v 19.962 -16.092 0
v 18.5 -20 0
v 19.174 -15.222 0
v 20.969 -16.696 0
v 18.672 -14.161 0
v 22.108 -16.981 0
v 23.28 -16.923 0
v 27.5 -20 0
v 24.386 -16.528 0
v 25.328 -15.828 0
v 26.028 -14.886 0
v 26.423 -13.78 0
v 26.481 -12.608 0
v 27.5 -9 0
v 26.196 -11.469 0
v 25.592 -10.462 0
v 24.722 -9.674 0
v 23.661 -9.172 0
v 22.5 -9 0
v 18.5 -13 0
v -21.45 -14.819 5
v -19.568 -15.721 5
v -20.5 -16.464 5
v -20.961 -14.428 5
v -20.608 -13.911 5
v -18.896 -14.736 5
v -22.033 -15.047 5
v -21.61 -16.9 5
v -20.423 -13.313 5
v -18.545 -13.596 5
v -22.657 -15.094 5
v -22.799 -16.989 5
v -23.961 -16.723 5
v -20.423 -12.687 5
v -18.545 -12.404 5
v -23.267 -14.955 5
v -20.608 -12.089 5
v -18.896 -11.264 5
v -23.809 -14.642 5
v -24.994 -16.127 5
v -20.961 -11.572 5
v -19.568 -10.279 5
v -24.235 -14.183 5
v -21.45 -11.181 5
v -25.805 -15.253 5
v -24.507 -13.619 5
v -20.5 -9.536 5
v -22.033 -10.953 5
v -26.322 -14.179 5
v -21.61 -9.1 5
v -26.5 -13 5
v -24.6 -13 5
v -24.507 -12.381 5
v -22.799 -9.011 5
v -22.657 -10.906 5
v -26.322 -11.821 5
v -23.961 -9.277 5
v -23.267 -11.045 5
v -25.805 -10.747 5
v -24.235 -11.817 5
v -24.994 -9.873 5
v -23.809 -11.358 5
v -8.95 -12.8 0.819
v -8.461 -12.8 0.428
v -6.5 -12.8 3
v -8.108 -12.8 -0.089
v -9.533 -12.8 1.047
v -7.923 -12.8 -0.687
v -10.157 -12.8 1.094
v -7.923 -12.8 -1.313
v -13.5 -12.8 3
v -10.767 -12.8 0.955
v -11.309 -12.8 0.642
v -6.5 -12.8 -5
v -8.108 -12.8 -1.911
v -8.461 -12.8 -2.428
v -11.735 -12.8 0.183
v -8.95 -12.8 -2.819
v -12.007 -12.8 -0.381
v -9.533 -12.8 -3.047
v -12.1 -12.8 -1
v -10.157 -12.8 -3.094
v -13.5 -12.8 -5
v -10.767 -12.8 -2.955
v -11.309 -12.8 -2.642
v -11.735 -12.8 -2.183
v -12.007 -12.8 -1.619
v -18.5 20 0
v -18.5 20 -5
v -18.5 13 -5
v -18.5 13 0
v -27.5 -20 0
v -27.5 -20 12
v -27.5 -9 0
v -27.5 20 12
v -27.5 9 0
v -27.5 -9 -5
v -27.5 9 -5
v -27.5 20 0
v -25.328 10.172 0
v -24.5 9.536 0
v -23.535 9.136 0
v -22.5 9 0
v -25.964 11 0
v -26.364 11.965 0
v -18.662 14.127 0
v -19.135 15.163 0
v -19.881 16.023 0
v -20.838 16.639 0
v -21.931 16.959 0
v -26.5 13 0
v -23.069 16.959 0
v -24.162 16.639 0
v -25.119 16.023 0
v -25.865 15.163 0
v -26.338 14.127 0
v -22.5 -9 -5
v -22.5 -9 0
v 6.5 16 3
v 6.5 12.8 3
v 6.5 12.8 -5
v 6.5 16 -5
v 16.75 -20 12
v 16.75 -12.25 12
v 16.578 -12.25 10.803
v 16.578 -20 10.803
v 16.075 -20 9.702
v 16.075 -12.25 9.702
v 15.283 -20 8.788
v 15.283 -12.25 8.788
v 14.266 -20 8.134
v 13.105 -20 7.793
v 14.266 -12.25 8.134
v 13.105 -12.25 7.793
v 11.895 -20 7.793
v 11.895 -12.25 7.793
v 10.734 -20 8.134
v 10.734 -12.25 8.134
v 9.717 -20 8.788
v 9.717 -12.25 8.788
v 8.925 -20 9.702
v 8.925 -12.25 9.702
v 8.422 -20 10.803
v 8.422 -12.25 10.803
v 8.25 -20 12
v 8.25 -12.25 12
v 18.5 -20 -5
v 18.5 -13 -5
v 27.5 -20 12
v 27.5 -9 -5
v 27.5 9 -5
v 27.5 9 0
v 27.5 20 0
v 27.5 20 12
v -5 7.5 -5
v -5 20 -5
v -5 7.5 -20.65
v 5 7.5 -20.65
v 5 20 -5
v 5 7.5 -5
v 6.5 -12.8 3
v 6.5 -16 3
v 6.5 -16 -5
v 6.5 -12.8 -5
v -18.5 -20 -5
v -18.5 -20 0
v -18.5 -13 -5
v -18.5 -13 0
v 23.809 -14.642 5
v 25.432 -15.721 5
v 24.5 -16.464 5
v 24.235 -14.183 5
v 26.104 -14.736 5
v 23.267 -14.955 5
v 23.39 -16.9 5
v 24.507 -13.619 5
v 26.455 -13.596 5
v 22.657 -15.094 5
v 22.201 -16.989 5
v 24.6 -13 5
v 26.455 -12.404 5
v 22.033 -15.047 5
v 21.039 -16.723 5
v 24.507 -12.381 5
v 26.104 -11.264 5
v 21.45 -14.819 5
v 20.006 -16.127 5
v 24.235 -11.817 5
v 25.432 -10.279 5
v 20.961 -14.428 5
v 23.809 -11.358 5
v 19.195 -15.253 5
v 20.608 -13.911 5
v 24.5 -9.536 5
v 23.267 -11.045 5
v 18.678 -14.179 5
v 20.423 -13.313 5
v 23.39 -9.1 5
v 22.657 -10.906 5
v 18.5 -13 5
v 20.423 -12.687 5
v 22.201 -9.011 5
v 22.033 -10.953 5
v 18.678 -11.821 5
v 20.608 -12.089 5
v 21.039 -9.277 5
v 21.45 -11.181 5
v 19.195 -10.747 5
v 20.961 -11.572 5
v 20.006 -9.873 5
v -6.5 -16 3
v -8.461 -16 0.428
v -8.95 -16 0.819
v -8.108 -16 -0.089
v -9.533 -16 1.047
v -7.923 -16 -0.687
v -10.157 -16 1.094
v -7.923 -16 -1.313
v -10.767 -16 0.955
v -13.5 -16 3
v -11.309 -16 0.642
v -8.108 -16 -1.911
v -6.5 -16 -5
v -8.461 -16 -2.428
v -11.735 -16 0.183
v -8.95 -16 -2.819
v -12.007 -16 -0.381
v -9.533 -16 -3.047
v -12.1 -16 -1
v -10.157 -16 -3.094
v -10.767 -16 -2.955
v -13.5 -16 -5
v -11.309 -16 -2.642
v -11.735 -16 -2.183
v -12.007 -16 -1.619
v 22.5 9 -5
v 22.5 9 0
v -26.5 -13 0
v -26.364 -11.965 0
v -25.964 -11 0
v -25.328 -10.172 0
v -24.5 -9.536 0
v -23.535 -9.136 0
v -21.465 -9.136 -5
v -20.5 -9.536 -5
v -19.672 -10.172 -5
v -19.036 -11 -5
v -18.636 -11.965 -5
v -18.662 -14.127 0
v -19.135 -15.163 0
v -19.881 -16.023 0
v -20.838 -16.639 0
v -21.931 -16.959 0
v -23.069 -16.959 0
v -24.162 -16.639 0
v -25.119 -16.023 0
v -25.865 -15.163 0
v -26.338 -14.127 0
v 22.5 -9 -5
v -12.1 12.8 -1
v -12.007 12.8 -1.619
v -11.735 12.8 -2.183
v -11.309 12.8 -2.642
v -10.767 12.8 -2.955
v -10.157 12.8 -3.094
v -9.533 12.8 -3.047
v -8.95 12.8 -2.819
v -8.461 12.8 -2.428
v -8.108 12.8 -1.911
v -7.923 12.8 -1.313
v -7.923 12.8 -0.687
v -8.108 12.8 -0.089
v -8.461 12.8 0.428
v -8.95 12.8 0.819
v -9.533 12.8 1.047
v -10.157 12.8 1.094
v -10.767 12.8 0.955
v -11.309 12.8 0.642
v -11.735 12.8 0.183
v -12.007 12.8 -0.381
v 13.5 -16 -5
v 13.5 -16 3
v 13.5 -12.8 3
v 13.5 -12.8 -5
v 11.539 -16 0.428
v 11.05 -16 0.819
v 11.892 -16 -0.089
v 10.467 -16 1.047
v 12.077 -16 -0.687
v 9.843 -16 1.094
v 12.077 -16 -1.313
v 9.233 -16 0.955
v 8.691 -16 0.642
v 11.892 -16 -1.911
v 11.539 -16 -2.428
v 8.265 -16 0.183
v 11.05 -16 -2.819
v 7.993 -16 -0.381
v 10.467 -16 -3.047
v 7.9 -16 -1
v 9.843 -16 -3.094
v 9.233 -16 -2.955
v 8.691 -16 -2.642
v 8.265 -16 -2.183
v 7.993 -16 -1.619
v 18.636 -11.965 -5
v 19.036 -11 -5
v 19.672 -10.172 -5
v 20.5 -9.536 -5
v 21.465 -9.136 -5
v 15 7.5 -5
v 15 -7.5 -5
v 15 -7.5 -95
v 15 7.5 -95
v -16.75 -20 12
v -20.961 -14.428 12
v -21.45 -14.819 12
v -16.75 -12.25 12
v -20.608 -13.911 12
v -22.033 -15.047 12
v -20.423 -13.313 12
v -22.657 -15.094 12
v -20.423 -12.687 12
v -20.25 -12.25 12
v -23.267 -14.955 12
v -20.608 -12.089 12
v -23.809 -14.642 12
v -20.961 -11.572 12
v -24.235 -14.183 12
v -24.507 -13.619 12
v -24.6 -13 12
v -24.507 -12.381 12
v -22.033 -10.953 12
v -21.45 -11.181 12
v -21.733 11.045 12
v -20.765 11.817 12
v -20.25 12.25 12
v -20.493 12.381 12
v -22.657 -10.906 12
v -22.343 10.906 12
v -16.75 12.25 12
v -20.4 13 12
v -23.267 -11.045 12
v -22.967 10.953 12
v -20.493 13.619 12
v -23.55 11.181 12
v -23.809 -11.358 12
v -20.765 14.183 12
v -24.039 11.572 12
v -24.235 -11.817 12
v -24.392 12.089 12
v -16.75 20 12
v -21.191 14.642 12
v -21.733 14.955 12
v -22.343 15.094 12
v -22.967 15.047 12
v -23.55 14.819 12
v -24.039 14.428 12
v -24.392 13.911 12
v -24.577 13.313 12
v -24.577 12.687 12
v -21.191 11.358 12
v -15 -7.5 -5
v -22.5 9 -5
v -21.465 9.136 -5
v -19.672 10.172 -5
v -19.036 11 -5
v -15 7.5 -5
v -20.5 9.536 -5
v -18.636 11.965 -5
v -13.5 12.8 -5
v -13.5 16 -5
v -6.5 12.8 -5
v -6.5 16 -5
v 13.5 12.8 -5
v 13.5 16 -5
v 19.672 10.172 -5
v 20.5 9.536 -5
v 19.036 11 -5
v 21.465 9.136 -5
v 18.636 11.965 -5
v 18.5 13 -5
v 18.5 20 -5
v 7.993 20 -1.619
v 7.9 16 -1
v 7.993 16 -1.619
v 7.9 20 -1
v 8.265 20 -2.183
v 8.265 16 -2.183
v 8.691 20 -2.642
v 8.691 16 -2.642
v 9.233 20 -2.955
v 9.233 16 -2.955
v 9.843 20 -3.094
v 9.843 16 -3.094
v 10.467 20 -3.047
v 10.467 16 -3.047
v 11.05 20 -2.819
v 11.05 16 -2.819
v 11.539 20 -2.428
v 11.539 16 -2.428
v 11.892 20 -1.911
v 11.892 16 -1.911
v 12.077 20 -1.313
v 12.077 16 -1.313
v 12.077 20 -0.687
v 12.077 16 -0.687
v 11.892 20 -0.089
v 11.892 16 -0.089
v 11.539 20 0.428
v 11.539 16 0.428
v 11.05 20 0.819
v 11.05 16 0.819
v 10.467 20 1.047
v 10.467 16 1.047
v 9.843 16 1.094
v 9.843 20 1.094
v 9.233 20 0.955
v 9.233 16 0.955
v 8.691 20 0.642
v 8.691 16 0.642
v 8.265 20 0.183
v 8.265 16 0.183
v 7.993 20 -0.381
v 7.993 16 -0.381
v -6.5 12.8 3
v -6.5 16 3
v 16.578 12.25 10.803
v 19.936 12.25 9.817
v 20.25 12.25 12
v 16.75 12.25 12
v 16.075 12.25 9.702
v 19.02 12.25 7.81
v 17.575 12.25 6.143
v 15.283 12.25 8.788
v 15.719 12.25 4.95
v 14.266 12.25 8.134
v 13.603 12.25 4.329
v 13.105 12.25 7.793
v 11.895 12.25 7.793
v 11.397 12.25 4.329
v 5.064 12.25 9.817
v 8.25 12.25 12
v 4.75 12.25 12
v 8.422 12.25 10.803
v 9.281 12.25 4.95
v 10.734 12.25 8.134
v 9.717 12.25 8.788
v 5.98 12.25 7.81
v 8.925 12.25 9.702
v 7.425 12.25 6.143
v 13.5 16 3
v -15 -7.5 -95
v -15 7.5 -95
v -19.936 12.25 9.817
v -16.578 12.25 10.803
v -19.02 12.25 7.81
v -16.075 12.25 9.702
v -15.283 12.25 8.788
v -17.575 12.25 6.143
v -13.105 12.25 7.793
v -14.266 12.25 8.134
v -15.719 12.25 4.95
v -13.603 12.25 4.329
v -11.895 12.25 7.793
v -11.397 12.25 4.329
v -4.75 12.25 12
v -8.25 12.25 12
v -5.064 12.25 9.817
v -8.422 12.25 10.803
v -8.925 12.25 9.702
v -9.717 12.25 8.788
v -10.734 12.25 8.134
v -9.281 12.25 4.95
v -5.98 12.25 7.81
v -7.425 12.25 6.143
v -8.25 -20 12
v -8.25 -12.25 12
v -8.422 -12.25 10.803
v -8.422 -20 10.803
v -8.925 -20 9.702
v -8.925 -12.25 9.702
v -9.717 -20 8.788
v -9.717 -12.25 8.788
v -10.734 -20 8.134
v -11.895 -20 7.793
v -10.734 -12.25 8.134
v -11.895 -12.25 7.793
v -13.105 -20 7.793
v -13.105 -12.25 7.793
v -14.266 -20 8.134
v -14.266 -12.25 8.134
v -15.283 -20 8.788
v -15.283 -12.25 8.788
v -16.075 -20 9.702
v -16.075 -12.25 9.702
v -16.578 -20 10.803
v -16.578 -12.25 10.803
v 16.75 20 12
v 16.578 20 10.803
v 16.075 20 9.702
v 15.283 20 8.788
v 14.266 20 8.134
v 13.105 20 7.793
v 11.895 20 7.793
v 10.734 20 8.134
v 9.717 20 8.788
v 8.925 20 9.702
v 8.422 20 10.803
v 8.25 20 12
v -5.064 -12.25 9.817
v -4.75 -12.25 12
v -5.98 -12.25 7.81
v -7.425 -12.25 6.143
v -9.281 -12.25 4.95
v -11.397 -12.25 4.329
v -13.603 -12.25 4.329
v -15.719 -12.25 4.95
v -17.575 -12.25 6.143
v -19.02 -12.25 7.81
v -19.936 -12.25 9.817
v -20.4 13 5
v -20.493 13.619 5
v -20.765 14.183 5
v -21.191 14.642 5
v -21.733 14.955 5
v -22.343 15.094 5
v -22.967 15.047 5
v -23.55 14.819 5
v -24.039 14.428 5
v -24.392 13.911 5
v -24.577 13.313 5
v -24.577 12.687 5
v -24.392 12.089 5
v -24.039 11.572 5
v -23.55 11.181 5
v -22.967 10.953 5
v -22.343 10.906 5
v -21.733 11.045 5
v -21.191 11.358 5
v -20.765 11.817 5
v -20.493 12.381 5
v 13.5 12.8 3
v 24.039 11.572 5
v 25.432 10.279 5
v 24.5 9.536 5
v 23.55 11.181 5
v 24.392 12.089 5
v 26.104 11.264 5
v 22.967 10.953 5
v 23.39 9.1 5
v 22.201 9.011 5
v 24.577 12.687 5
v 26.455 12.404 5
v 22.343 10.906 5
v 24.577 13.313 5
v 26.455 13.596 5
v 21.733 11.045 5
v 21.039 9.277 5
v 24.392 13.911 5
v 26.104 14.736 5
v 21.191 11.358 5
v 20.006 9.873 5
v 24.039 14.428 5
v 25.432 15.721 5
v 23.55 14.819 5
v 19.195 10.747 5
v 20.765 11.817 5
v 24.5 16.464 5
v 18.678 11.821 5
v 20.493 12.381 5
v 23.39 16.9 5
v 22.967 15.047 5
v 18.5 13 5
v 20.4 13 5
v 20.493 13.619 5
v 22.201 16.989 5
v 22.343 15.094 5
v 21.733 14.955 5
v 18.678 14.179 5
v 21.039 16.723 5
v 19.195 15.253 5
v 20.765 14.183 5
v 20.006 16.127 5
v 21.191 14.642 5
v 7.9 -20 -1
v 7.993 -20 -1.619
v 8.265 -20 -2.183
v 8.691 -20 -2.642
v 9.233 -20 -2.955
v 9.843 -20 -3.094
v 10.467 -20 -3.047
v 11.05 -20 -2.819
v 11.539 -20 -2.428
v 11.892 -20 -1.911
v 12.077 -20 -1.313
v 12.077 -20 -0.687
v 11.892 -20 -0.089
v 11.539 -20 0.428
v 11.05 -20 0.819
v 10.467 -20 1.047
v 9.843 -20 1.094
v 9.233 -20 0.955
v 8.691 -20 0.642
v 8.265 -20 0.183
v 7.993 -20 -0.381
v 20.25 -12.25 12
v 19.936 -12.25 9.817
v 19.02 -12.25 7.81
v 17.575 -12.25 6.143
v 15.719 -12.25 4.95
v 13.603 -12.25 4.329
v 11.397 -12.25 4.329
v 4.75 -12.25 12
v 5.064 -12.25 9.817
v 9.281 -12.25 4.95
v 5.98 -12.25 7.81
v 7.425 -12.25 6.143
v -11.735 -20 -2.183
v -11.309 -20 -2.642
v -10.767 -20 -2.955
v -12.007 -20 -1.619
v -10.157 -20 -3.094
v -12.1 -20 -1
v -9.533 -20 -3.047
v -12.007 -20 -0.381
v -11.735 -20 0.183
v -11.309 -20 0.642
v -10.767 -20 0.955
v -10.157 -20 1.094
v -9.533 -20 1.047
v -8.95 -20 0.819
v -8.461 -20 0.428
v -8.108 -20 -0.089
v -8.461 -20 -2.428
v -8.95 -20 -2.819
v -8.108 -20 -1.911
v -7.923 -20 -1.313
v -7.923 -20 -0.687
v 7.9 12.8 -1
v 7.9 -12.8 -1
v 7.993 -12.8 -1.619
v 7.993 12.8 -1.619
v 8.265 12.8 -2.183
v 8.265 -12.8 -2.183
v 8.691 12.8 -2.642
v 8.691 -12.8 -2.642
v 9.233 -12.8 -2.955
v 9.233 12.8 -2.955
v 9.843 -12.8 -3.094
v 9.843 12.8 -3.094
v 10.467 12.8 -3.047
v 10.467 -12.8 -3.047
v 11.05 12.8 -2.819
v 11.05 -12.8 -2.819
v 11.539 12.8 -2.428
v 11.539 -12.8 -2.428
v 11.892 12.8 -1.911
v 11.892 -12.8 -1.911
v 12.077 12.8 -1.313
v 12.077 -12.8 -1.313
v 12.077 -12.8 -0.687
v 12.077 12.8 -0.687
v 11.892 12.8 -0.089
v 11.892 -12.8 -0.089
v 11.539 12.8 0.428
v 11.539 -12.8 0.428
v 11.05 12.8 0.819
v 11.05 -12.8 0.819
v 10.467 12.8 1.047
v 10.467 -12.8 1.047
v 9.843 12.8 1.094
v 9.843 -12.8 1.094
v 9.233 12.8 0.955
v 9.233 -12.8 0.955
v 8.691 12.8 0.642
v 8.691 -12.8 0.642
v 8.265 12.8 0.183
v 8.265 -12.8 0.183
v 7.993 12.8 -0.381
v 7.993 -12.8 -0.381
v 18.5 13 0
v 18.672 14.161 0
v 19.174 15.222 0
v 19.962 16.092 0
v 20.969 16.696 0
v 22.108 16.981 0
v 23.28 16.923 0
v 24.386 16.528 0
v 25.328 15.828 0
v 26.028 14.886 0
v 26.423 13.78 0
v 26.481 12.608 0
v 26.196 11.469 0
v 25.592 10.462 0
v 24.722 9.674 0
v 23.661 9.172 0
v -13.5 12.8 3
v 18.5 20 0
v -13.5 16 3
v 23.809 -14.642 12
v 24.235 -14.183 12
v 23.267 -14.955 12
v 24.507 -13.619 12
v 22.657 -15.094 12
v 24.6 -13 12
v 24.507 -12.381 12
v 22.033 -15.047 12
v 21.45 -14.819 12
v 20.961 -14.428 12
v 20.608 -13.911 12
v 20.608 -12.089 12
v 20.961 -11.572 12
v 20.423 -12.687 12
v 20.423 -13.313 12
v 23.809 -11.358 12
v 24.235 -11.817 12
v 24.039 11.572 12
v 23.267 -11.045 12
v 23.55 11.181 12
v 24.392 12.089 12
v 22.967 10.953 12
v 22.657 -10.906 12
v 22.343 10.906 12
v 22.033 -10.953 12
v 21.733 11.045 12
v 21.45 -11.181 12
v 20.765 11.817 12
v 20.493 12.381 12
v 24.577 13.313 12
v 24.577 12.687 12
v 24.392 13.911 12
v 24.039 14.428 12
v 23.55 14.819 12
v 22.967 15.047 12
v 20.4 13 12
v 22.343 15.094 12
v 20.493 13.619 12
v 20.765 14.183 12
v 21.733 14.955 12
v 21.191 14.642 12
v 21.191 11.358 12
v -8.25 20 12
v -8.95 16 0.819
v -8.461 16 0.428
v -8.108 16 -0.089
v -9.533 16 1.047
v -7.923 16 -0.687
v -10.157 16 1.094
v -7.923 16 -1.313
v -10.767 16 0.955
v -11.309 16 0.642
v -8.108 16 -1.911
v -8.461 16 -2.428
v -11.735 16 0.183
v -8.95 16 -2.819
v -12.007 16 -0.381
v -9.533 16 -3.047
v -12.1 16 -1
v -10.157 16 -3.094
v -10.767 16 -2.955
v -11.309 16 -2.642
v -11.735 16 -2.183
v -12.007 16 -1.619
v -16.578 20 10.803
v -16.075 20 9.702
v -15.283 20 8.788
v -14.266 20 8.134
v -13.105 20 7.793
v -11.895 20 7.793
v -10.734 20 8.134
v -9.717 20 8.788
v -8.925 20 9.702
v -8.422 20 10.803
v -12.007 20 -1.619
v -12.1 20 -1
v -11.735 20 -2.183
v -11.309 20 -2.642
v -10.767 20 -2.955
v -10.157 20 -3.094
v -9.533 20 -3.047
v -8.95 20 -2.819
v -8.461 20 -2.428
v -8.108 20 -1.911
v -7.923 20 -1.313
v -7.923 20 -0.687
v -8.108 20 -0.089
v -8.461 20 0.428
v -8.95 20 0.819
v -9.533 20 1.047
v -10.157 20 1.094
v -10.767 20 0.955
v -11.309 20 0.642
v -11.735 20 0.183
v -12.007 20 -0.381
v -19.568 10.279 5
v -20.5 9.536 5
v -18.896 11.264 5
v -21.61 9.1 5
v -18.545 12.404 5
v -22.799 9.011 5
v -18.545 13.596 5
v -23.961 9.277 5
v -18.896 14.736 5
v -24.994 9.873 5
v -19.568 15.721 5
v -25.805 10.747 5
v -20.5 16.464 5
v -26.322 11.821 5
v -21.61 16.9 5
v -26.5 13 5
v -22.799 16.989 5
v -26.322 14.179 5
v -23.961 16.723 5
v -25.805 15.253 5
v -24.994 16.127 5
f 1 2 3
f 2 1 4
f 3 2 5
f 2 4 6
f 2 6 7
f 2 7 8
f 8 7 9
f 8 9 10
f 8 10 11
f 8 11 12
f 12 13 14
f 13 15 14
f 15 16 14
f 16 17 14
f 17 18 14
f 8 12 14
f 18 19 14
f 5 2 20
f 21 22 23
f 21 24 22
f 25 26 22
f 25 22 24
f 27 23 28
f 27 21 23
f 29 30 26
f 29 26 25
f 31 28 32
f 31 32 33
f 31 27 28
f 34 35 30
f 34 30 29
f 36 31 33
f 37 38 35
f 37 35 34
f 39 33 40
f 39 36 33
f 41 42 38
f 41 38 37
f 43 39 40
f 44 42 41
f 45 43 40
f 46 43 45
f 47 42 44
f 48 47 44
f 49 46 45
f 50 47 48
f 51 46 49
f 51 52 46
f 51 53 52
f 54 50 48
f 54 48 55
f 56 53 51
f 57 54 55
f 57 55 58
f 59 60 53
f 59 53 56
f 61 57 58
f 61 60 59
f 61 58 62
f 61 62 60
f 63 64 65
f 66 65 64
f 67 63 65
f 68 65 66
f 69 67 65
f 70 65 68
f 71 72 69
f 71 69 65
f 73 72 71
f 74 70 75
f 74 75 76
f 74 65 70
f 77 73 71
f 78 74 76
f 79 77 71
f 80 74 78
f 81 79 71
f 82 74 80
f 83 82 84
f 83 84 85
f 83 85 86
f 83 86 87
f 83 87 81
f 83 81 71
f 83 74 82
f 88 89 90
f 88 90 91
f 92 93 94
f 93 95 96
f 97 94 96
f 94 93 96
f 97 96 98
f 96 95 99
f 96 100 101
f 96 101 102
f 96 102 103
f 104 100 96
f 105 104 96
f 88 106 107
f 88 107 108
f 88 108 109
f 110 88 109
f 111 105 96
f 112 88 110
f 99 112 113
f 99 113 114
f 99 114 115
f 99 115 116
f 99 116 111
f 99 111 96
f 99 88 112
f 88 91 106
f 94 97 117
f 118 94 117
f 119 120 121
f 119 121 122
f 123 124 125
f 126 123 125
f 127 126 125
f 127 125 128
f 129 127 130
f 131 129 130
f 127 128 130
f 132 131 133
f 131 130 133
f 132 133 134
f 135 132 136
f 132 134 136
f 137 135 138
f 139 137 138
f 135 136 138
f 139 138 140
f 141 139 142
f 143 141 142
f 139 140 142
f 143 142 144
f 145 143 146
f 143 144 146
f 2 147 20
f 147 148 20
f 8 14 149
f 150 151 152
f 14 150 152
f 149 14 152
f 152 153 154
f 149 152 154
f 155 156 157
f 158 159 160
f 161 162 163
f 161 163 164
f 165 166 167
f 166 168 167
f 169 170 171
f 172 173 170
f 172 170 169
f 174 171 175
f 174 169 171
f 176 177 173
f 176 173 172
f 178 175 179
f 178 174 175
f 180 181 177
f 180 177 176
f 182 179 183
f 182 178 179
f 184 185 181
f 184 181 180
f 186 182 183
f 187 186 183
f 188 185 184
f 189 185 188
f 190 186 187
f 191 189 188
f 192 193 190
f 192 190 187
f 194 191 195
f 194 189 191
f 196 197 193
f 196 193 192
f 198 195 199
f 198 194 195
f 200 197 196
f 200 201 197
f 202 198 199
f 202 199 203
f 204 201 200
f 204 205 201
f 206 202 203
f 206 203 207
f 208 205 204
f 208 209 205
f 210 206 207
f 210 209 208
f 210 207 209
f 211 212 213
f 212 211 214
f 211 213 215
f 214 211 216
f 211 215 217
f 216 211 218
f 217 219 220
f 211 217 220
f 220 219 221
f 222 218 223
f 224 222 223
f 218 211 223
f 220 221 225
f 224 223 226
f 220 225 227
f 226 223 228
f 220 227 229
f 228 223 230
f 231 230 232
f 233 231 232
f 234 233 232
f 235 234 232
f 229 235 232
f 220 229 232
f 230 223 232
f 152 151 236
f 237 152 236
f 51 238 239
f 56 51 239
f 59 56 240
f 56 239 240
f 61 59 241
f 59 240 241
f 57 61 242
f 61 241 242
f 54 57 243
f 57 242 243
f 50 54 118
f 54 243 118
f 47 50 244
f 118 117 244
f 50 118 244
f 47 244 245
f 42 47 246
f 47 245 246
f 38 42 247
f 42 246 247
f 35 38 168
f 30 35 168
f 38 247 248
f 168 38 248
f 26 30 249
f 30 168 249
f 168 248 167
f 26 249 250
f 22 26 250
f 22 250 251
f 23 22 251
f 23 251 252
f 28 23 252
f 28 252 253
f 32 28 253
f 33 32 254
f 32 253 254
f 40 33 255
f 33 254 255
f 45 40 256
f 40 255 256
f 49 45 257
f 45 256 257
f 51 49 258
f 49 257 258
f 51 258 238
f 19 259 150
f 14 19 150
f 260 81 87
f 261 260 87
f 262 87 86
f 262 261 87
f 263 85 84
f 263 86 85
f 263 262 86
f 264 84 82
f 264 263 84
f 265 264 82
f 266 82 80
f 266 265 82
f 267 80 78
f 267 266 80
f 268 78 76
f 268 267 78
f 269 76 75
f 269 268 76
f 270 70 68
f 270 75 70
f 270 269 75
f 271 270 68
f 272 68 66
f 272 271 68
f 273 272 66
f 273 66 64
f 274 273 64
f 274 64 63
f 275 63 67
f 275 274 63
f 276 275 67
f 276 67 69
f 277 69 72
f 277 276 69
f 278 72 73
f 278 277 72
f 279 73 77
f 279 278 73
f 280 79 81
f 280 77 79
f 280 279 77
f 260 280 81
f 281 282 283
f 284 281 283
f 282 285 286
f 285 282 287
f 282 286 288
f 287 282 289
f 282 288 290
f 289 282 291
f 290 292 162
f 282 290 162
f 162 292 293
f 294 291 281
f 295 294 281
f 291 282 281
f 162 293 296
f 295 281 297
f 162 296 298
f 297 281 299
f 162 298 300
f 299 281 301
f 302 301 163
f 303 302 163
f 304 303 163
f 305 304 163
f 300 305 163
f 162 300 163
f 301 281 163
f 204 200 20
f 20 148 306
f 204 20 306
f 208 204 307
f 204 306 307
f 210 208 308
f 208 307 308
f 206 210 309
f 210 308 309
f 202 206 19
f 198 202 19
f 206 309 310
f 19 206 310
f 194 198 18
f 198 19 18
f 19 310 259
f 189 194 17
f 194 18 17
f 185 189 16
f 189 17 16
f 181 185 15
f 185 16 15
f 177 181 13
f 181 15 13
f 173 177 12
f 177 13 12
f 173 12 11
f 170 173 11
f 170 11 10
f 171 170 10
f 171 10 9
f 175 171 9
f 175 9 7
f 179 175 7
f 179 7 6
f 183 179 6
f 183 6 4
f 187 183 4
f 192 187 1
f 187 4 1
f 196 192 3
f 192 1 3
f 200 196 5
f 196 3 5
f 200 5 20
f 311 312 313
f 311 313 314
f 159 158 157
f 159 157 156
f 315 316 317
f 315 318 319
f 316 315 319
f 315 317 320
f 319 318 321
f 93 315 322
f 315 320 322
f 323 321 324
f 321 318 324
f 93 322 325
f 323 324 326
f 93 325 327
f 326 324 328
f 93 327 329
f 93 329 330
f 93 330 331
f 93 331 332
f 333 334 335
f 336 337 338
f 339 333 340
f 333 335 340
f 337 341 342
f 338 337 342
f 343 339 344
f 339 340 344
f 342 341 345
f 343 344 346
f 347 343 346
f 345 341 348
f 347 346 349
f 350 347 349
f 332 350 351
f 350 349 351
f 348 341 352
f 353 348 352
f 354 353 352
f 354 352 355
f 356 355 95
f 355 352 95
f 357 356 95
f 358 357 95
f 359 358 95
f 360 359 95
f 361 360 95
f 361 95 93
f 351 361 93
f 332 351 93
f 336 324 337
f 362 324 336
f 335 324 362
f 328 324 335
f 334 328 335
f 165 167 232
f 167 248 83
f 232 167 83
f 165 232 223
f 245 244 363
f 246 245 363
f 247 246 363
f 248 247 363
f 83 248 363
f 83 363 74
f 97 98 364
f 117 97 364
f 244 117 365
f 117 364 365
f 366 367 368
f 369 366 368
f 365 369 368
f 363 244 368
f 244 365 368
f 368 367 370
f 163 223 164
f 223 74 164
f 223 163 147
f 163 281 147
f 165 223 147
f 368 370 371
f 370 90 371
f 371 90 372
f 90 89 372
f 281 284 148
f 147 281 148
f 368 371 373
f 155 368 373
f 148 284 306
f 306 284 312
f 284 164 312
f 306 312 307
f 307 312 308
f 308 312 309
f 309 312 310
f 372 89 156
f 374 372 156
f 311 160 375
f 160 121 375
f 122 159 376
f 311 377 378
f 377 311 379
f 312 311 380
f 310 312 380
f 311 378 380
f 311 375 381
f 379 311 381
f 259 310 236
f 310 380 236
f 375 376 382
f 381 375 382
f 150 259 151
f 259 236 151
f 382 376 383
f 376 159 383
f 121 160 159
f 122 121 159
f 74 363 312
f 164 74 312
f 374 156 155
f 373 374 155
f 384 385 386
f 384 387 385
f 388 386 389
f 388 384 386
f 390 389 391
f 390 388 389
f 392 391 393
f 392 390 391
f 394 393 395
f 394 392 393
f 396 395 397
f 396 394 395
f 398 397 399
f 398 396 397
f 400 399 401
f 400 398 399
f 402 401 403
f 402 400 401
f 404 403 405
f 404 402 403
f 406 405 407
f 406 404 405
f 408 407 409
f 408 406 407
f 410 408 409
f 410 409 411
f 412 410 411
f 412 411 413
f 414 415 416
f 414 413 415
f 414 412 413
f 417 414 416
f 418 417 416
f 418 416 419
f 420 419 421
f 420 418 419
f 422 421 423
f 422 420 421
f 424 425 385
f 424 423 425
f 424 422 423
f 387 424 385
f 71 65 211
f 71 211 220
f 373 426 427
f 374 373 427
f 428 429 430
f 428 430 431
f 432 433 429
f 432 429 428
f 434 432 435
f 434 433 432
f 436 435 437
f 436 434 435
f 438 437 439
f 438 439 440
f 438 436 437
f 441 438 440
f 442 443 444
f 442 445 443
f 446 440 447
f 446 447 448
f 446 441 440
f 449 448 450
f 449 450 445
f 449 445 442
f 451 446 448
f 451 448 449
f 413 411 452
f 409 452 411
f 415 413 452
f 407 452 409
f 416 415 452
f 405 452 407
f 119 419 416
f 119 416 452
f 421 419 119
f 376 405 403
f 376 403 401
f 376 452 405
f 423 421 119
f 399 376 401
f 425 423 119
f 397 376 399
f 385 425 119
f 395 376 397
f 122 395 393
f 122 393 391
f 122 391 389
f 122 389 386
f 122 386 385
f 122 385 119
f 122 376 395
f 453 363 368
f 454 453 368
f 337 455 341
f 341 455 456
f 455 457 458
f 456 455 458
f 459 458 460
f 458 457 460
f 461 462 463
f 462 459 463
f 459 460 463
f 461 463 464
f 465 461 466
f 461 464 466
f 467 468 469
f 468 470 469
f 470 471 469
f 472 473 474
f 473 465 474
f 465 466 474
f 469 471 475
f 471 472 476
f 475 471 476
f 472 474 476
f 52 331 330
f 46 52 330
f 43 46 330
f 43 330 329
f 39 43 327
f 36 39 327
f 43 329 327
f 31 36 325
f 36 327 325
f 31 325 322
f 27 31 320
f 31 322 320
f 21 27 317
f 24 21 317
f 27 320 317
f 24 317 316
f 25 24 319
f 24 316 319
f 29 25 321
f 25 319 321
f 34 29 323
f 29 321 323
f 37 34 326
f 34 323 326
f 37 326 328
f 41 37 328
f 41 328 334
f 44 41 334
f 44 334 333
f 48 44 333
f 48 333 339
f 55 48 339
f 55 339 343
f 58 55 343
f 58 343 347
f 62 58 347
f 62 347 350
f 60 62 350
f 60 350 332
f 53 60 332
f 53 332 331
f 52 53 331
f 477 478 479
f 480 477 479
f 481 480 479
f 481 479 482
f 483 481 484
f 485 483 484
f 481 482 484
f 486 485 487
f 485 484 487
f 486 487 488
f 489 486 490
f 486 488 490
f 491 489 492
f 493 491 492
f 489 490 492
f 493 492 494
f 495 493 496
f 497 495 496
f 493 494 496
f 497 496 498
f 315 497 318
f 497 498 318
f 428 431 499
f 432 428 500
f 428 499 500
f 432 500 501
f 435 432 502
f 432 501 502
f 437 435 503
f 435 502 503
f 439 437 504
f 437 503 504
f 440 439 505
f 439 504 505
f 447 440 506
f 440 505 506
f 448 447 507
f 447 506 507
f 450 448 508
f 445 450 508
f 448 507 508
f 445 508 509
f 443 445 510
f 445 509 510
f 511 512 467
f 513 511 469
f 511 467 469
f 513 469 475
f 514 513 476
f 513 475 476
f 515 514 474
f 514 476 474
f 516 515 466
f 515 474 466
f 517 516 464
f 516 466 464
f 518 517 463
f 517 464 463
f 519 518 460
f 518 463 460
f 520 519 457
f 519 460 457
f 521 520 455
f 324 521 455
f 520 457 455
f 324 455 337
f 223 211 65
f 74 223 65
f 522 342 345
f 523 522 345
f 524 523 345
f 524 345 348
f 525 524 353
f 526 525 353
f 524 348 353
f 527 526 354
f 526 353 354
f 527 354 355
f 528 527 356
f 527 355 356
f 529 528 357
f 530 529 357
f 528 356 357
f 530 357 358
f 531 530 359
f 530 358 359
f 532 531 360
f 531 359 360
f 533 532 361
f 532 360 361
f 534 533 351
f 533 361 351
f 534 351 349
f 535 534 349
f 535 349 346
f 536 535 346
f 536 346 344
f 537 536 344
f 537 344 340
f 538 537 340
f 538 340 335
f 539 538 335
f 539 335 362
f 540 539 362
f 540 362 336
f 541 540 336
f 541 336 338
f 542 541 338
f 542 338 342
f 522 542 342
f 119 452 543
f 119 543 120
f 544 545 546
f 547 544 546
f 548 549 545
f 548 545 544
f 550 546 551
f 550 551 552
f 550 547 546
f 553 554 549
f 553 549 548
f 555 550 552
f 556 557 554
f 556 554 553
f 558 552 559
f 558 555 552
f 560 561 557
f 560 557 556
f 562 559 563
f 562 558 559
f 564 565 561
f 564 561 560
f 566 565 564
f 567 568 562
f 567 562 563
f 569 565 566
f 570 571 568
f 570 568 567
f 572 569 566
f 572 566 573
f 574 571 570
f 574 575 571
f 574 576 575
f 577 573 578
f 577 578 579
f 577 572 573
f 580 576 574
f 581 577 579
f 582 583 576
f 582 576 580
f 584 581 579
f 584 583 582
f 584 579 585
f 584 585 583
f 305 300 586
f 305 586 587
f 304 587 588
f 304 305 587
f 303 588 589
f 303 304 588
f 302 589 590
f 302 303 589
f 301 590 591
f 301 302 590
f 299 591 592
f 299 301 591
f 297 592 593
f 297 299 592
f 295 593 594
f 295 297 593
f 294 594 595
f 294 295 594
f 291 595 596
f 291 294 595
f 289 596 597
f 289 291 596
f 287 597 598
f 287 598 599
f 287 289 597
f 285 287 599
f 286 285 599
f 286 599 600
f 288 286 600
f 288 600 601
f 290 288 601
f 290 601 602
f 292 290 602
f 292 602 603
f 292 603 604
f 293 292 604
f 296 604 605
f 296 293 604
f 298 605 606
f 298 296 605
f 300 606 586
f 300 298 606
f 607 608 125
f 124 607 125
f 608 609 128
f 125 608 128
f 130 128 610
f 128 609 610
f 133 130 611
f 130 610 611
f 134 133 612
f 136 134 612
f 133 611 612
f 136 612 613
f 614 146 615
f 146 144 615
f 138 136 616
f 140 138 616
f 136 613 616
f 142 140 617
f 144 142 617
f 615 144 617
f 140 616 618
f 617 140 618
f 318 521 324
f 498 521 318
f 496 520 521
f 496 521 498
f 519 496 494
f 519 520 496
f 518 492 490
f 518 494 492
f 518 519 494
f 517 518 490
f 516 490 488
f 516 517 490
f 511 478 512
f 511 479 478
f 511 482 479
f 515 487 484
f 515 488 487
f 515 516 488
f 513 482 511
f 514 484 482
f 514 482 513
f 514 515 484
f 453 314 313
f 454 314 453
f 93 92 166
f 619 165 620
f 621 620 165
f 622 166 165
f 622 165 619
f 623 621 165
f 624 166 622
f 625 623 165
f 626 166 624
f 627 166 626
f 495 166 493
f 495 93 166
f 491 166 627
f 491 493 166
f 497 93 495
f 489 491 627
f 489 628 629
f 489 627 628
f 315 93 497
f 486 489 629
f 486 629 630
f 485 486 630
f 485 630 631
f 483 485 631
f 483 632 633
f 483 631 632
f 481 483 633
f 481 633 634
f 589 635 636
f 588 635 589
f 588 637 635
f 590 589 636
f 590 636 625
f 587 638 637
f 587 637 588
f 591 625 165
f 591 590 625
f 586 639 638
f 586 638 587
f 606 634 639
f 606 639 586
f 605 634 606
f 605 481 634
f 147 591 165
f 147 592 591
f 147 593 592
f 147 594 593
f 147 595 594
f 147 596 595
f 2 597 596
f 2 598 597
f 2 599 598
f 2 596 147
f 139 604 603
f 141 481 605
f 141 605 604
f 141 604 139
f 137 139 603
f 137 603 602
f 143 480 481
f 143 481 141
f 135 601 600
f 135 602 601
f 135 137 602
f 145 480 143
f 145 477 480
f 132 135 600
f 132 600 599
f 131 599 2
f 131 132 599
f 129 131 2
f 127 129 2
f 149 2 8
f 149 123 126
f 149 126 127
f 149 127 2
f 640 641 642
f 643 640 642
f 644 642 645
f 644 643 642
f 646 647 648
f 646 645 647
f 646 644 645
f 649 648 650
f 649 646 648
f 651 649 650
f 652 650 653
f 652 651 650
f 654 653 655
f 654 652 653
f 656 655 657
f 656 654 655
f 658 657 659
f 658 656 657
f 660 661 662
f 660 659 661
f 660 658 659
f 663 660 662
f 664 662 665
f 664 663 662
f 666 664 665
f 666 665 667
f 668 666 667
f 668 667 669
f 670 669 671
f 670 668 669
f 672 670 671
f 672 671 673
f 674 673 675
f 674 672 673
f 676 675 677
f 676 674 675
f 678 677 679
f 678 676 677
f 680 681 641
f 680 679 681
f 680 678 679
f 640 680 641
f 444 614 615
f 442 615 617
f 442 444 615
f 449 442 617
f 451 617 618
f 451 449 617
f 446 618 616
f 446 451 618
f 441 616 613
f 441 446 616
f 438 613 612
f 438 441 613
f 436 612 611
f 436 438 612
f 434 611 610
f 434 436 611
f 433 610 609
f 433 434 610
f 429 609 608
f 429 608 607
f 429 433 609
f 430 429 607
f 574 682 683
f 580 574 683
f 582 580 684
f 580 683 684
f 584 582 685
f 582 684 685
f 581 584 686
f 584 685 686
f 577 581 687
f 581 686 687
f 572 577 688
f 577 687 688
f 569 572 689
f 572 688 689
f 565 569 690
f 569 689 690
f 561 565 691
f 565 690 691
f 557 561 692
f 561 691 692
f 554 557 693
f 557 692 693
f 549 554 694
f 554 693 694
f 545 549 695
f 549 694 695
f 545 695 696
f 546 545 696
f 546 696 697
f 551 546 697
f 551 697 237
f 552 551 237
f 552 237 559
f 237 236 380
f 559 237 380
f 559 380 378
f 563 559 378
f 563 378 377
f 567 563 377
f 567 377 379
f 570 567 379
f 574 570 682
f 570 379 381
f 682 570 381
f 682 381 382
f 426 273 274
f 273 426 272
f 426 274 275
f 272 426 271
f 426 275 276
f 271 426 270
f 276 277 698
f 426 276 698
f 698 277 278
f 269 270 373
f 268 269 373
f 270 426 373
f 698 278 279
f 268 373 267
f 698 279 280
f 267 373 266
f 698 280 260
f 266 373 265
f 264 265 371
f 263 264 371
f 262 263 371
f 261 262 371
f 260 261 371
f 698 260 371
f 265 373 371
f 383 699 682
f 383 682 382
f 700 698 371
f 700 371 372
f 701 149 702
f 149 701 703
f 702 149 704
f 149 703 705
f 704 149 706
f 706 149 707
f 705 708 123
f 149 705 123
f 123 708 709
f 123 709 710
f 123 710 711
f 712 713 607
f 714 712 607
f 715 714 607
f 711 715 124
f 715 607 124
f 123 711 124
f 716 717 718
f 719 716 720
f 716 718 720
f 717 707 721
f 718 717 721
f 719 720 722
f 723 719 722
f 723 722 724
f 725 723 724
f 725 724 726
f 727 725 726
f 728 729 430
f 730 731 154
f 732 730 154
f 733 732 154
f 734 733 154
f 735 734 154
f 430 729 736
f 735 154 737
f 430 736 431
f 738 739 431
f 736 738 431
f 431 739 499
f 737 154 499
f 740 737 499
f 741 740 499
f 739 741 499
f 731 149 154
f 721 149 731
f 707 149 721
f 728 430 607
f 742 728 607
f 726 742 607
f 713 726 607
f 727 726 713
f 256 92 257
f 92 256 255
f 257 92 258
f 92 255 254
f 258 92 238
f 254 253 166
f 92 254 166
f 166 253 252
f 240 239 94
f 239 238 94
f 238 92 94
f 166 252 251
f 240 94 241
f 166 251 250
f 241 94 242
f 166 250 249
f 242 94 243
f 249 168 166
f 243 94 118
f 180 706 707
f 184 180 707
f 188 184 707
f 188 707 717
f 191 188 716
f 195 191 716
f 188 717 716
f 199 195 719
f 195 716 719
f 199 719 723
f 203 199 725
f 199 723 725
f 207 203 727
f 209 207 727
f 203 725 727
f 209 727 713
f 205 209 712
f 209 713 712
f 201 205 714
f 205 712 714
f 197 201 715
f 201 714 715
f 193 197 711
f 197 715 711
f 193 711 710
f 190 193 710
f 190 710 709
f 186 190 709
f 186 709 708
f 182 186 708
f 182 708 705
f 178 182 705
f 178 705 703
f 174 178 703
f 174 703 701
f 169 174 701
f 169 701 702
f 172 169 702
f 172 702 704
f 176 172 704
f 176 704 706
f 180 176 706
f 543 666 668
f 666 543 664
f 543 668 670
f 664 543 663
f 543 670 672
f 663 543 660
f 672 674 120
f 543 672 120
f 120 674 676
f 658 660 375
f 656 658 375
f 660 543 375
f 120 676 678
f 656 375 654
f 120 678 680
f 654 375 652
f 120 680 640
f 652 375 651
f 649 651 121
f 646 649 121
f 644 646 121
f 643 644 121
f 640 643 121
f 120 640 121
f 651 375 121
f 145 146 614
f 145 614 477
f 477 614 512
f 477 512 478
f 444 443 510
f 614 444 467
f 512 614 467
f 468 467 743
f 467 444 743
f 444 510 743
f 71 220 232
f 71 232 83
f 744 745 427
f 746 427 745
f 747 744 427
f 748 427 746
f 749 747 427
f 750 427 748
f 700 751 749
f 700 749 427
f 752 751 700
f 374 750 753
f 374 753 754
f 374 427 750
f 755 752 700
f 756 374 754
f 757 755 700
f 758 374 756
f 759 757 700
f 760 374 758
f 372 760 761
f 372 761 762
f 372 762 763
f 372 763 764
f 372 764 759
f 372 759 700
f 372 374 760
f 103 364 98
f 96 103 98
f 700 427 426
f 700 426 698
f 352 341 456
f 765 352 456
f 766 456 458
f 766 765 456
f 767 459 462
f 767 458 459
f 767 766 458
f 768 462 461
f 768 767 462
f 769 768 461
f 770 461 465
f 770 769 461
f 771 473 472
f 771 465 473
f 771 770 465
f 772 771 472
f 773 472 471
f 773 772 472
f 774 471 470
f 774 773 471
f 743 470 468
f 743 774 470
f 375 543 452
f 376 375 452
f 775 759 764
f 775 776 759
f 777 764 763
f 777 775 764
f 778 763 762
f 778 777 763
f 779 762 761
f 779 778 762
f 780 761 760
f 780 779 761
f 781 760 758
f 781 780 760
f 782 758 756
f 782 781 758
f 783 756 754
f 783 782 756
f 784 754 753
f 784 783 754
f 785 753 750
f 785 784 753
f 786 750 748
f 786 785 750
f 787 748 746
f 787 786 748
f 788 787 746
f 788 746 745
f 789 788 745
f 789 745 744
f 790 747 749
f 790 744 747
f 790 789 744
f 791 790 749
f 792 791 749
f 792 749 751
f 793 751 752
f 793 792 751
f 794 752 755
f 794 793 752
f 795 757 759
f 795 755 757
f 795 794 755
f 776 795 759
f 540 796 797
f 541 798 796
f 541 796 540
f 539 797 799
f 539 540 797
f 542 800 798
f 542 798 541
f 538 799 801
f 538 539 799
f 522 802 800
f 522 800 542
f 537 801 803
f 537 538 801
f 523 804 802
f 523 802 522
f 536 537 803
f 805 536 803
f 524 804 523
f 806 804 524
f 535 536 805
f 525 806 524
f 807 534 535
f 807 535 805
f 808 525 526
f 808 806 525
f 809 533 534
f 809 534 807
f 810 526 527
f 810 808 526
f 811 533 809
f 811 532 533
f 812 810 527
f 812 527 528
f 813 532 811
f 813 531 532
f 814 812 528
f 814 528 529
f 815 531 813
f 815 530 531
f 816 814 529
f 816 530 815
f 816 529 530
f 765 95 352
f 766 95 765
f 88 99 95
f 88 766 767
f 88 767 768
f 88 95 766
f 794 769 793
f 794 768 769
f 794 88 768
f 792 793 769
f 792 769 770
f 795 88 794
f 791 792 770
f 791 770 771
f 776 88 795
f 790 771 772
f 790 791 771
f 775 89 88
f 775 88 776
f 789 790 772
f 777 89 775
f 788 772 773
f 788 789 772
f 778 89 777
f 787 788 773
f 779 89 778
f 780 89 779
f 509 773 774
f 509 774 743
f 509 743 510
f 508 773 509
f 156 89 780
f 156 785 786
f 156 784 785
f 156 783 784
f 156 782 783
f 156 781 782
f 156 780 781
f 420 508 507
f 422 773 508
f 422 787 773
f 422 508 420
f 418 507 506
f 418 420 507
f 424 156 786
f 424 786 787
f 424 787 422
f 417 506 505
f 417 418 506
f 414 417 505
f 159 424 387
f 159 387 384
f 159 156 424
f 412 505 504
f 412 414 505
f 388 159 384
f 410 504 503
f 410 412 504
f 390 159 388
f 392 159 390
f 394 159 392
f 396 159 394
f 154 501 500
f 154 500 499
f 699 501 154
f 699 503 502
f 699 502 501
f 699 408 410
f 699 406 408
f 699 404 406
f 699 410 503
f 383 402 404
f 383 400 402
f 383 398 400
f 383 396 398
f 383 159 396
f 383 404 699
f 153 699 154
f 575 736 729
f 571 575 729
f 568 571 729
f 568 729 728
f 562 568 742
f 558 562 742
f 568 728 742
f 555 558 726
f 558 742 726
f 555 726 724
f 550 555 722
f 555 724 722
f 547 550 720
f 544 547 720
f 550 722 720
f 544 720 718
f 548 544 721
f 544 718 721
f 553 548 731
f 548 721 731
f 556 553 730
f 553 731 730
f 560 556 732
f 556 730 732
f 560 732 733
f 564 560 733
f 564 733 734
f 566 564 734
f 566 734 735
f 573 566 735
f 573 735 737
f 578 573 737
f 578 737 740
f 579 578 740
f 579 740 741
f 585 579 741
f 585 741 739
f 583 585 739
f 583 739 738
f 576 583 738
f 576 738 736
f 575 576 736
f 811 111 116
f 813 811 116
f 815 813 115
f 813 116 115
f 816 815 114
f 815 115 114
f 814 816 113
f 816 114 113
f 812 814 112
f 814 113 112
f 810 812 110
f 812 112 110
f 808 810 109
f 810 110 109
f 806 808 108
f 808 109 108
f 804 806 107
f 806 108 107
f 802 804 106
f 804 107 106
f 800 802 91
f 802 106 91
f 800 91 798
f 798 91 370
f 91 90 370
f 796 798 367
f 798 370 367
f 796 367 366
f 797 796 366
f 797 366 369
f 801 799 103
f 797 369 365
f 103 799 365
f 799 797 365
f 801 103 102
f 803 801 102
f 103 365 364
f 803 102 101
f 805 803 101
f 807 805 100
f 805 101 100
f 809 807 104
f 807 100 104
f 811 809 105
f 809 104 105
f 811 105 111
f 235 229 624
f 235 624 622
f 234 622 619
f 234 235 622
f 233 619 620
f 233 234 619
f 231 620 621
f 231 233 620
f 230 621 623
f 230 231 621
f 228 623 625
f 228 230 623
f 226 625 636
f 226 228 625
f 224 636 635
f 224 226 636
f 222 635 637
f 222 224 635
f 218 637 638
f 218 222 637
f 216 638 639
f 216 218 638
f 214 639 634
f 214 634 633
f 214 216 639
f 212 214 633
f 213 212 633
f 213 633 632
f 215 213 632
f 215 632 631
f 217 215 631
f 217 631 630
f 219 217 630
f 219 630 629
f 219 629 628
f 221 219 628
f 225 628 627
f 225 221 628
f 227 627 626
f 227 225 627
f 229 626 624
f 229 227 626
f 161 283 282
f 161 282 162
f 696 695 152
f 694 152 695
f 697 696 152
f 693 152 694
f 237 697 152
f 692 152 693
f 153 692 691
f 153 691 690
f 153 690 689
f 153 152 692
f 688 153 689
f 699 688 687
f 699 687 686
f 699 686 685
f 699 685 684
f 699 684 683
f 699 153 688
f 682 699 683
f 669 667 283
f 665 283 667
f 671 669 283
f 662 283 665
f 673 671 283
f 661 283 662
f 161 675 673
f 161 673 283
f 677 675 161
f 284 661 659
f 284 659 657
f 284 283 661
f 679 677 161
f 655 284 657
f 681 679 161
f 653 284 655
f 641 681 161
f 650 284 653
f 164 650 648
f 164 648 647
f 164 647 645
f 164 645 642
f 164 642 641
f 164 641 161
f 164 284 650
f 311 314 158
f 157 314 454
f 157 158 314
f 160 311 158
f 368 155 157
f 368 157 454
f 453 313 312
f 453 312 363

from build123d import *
from build123d.topology import SkipClean

# Parameters (mm, degrees)
ESQUISSE1_W              = 55
ESQUISSE1_H              = 45
BOSS_EXTRU_1_DEPTH       = 12
ESQUISSE2_R              = 4.25
ENL_V_MAT_EXTRU_1_DEPTH  = 55.085580333
ESQUISSE3_R              = 7.75
ENL_V_MAT_EXTRU_2_DEPTH  = 12.25
ESQUISSE9_W              = 61.062756781
ESQUISSE9_H              = 12.22812859
ESQUISSE9_W_2            = 59.427147224
ESQUISSE9_H_2            = 8.100161614
ENL_V_MAT_EXTRU_7_DEPTH  = 31
SKETCH1_W                = 55
SKETCH1_H                = 36
BOSS_EXTRUDE1_DEPTH      = 5
SKETCH2_R                = 2.1
CUT_EXTRUDE1_DEPTH       = 38.003378224
SKETCH3_R                = 4
CUT_EXTRUDE2_DEPTH       = 10
CUT_EXTRUDE3_DEPTH       = 5
SKETCH5_R                = 2.1
CUT_EXTRUDE4_DEPTH       = 47.864165415
BOSS_EXTRUDE4_START      = 2
SKETCH7_R                = 2.1
BOSS_EXTRUDE4_DEPTH      = 2
SKETCH8_R                = 2.1
BOSS_EXTRUDE5_DEPTH      = 2
SKETCH9_W                = 7
SKETCH9_H                = 3.2
CUT_EXTRUDE6_DEPTH       = 8
SKETCH10_W               = 30
SKETCH10_H               = 15
BOSS_EXTRUDE6_DEPTH      = 90
BOSS_EXTRUDE7_DEPTH      = 5
BOSS_EXTRUDE7_DEPTH_BACK = 5


with BuildPart() as part:
    # Esquisse1 → Boss.-Extru.1 (new body)
    with BuildSketch(Plane.XY):
        Rectangle(ESQUISSE1_W, ESQUISSE1_H)
    extrude(amount=BOSS_EXTRU_1_DEPTH)

    # Esquisse2 → Enlèv. mat.-Extru.1 (cut, through all)
    with BuildSketch(Plane(origin=(0, 22.5, 0), x_dir=(1, 0, 0), z_dir=(0, 1, 0))):
        with Locations((-12.5, -12)):
            Circle(ESQUISSE2_R)
        with Locations((12.5, -12)):
            Circle(ESQUISSE2_R)
    extrude(amount=-ENL_V_MAT_EXTRU_1_DEPTH, mode=Mode.SUBTRACT)

    # Esquisse3 → Enlèv. mat.-Extru.2 (cut, symmetric)
    with BuildSketch(Plane(origin=(0, 0, 0), x_dir=(1, 0, 0), z_dir=(0, 1, 0))):
        with Locations((-12.5, -12)):
            Circle(ESQUISSE3_R)
    enl_v_mat_extru_2 = extrude(amount=ENL_V_MAT_EXTRU_2_DEPTH, both=True, mode=Mode.SUBTRACT)

    # Esquisse9 → Enlèv. mat.-Extru.7 (cut)
    with BuildSketch(Plane.XY.offset(12)):
        with Locations((-0.389430846, -24.114064295)):
            Rectangle(ESQUISSE9_W, ESQUISSE9_H)
        with Locations((1.674552641, 22.050080807)):
            Rectangle(ESQUISSE9_W_2, ESQUISSE9_H_2)
    extrude(amount=-ENL_V_MAT_EXTRU_7_DEPTH, mode=Mode.SUBTRACT)

    # Sketch1 → Boss-Extrude1 (add)
    with BuildSketch(Plane(origin=(0, 0, 0), x_dir=(-1, 0, 0), z_dir=(0, 0, -1))):
        Rectangle(SKETCH1_W, SKETCH1_H)
    extrude(amount=BOSS_EXTRUDE1_DEPTH)

    # Sketch2 → Cut-Extrude1 (cut, through all)
    with BuildSketch(Plane.XY.offset(12)):
        with Locations((-22.5, 13)):
            Circle(SKETCH2_R)
        with Locations((22.5, 13)):
            Circle(SKETCH2_R)
        with Locations((22.5, -13)):
            Circle(SKETCH2_R)
        with Locations((-22.5, -13)):
            Circle(SKETCH2_R)
    extrude(amount=-CUT_EXTRUDE1_DEPTH, mode=Mode.SUBTRACT)

    # Sketch3 → Cut-Extrude2 (cut)
    with BuildSketch(Plane(origin=(0, 0, -5), x_dir=(-1, 0, 0), z_dir=(0, 0, -1))):
        with Locations((-22.5, 13)):
            Circle(SKETCH3_R)
        with Locations((22.5, 13)):
            Circle(SKETCH3_R)
        with Locations((22.5, -13)):
            Circle(SKETCH3_R)
        with Locations((-22.5, -13)):
            Circle(SKETCH3_R)
    extrude(amount=-CUT_EXTRUDE2_DEPTH, mode=Mode.SUBTRACT)

    # Sketch4 → Cut-Extrude3 (cut)
    with BuildSketch(Plane(origin=(0, 0, -5), x_dir=(-1, 0, 0), z_dir=(0, 0, -1))):
        with BuildLine():
            Line((-18.5, 13), (-18.5, 18))
            Line((-18.5, 18), (-27.5, 18))
            Line((-27.5, 18), (-27.5, 9))
            Line((-27.5, 9), (-22.5, 9))
            ThreePointArc((-22.5, 9), (-25.328427125, 15.828427125), (-18.5, 13))
        make_face()
        with BuildLine():
            Line((-22.5, -9), (-27.5, -9))
            Line((-27.5, -9), (-27.5, -18))
            Line((-27.5, -18), (-18.5, -18))
            Line((-18.5, -18), (-18.5, -13))
            ThreePointArc((-18.5, -13), (-25.328427125, -15.828427125), (-22.5, -9))
        make_face()
        with BuildLine():
            Line((27.5, -18), (27.5, -9))
            Line((27.5, -9), (22.5, -9))
            ThreePointArc((22.5, -9), (25.328427125, -15.828427125), (18.5, -13))
            Line((18.5, -13), (18.5, -18))
            Line((18.5, -18), (27.5, -18))
        make_face()
        with BuildLine():
            Line((27.5, 18), (18.5, 18))
            Line((18.5, 18), (18.5, 13))
            ThreePointArc((18.5, 13), (25.328427125, 15.828427125), (22.5, 9))
            Line((22.5, 9), (27.5, 9))
            Line((27.5, 9), (27.5, 18))
        make_face()
    extrude(amount=-CUT_EXTRUDE3_DEPTH, mode=Mode.SUBTRACT)

    # Sketch5 → Cut-Extrude4 (cut, through all)
    with BuildSketch(Plane(origin=(0, 18, 0), x_dir=(1, 0, 0), z_dir=(0, 1, 0))):
        with Locations((-10, 1)):
            Circle(SKETCH5_R)
        with Locations((10, 1)):
            Circle(SKETCH5_R)
    extrude(amount=-CUT_EXTRUDE4_DEPTH, mode=Mode.SUBTRACT)

    # Sketch7 → Boss-Extrude4 (add)
    with SkipClean():  # the faces are left unmerged after this step: merging them gives an invalid solid
        with BuildSketch(Plane(origin=(0, 18, 0), x_dir=(1, 0, 0), z_dir=(0, 1, 0)).offset(BOSS_EXTRUDE4_START)):
            with BuildLine():
                Line((18.5, 5), (-18.5, 5))
                Line((-18.5, 5), (-18.5, 0))
                Line((-18.5, 0), (-27.5, 0))
                Line((-27.5, 0), (-27.5, -12))
                Line((-27.5, -12), (-16.75, -12))
                ThreePointArc((-16.75, -12), (-12.5, -7.75), (-8.25, -12))
                Line((-8.25, -12), (8.25, -12))
                ThreePointArc((8.25, -12), (12.5, -7.75), (16.75, -12))
                Line((16.75, -12), (27.5, -12))
                Line((27.5, -12), (27.5, 0))
                Line((27.5, 0), (18.5, 0))
                Line((18.5, 0), (18.5, 5))
            make_face()
            with Locations((10, 1)):
                Circle(SKETCH7_R, mode=Mode.SUBTRACT)
            with Locations((-10, 1)):
                Circle(SKETCH7_R, mode=Mode.SUBTRACT)
        extrude(amount=-BOSS_EXTRUDE4_DEPTH)
    add(part.part.scale(1), mode=Mode.REPLACE)  # the faces are merged on a copy

    # Sketch8 → Boss-Extrude5 (add)
    with BuildSketch(Plane.XZ.offset(18)):
        with BuildLine():
            Line((-27.5, 0), (-18.5, 0))
            Line((-18.5, 0), (-18.5, -5))
            Line((-18.5, -5), (18.5, -5))
            Line((18.5, -5), (18.5, 0))
            Line((18.5, 0), (27.5, 0))
            Line((27.5, 0), (27.5, 12))
            Line((27.5, 12), (16.75, 12))
            ThreePointArc((16.75, 12), (12.5, 7.75), (8.25, 12))
            Line((8.25, 12), (-8.25, 12))
            ThreePointArc((-8.25, 12), (-12.5, 7.75), (-16.75, 12))
            Line((-16.75, 12), (-27.5, 12))
            Line((-27.5, 12), (-27.5, 0))
        make_face()
        with Locations((10, -1)):
            Circle(SKETCH8_R, mode=Mode.SUBTRACT)
        with Locations((-10, -1)):
            Circle(SKETCH8_R, mode=Mode.SUBTRACT)
    extrude(amount=BOSS_EXTRUDE5_DEPTH)

    # Sketch9 → Cut-Extrude6 (cut)
    with BuildSketch(Plane(origin=(0, 0, -5), x_dir=(-1, 0, 0), z_dir=(0, 0, -1))):
        with Locations((-10, 14.4)):
            Rectangle(SKETCH9_W, SKETCH9_H)
        with Locations((10, 14.4)):
            Rectangle(SKETCH9_W, SKETCH9_H)
        with Locations((10, -14.4)):
            Rectangle(SKETCH9_W, SKETCH9_H)
        with Locations((-10, -14.4)):
            Rectangle(SKETCH9_W, SKETCH9_H)
    extrude(amount=-CUT_EXTRUDE6_DEPTH, mode=Mode.SUBTRACT)

    # Mirror1: Enlèv. mat.-Extru.2 across plane
    add(enl_v_mat_extru_2.mirror(Plane.ZY), mode=Mode.SUBTRACT)

    # Sketch10 → Boss-Extrude6 (add)
    with BuildSketch(Plane(origin=(0, 0, -5), x_dir=(-1, 0, 0), z_dir=(0, 0, -1))):
        Rectangle(SKETCH10_W, SKETCH10_H)
    extrude(amount=BOSS_EXTRUDE6_DEPTH)

    # Sketch11 → Boss-Extrude7 (add, two sides: drawn at the far end of the back side and taken through both)
    with BuildSketch(Plane.ZY.offset(-BOSS_EXTRUDE7_DEPTH_BACK)):
        Polygon((-5, 7.5), (-20.649753688, 7.5), (-5, 20), align=None)
    extrude(amount=BOSS_EXTRUDE7_DEPTH + BOSS_EXTRUDE7_DEPTH_BACK)


solid = part.part
